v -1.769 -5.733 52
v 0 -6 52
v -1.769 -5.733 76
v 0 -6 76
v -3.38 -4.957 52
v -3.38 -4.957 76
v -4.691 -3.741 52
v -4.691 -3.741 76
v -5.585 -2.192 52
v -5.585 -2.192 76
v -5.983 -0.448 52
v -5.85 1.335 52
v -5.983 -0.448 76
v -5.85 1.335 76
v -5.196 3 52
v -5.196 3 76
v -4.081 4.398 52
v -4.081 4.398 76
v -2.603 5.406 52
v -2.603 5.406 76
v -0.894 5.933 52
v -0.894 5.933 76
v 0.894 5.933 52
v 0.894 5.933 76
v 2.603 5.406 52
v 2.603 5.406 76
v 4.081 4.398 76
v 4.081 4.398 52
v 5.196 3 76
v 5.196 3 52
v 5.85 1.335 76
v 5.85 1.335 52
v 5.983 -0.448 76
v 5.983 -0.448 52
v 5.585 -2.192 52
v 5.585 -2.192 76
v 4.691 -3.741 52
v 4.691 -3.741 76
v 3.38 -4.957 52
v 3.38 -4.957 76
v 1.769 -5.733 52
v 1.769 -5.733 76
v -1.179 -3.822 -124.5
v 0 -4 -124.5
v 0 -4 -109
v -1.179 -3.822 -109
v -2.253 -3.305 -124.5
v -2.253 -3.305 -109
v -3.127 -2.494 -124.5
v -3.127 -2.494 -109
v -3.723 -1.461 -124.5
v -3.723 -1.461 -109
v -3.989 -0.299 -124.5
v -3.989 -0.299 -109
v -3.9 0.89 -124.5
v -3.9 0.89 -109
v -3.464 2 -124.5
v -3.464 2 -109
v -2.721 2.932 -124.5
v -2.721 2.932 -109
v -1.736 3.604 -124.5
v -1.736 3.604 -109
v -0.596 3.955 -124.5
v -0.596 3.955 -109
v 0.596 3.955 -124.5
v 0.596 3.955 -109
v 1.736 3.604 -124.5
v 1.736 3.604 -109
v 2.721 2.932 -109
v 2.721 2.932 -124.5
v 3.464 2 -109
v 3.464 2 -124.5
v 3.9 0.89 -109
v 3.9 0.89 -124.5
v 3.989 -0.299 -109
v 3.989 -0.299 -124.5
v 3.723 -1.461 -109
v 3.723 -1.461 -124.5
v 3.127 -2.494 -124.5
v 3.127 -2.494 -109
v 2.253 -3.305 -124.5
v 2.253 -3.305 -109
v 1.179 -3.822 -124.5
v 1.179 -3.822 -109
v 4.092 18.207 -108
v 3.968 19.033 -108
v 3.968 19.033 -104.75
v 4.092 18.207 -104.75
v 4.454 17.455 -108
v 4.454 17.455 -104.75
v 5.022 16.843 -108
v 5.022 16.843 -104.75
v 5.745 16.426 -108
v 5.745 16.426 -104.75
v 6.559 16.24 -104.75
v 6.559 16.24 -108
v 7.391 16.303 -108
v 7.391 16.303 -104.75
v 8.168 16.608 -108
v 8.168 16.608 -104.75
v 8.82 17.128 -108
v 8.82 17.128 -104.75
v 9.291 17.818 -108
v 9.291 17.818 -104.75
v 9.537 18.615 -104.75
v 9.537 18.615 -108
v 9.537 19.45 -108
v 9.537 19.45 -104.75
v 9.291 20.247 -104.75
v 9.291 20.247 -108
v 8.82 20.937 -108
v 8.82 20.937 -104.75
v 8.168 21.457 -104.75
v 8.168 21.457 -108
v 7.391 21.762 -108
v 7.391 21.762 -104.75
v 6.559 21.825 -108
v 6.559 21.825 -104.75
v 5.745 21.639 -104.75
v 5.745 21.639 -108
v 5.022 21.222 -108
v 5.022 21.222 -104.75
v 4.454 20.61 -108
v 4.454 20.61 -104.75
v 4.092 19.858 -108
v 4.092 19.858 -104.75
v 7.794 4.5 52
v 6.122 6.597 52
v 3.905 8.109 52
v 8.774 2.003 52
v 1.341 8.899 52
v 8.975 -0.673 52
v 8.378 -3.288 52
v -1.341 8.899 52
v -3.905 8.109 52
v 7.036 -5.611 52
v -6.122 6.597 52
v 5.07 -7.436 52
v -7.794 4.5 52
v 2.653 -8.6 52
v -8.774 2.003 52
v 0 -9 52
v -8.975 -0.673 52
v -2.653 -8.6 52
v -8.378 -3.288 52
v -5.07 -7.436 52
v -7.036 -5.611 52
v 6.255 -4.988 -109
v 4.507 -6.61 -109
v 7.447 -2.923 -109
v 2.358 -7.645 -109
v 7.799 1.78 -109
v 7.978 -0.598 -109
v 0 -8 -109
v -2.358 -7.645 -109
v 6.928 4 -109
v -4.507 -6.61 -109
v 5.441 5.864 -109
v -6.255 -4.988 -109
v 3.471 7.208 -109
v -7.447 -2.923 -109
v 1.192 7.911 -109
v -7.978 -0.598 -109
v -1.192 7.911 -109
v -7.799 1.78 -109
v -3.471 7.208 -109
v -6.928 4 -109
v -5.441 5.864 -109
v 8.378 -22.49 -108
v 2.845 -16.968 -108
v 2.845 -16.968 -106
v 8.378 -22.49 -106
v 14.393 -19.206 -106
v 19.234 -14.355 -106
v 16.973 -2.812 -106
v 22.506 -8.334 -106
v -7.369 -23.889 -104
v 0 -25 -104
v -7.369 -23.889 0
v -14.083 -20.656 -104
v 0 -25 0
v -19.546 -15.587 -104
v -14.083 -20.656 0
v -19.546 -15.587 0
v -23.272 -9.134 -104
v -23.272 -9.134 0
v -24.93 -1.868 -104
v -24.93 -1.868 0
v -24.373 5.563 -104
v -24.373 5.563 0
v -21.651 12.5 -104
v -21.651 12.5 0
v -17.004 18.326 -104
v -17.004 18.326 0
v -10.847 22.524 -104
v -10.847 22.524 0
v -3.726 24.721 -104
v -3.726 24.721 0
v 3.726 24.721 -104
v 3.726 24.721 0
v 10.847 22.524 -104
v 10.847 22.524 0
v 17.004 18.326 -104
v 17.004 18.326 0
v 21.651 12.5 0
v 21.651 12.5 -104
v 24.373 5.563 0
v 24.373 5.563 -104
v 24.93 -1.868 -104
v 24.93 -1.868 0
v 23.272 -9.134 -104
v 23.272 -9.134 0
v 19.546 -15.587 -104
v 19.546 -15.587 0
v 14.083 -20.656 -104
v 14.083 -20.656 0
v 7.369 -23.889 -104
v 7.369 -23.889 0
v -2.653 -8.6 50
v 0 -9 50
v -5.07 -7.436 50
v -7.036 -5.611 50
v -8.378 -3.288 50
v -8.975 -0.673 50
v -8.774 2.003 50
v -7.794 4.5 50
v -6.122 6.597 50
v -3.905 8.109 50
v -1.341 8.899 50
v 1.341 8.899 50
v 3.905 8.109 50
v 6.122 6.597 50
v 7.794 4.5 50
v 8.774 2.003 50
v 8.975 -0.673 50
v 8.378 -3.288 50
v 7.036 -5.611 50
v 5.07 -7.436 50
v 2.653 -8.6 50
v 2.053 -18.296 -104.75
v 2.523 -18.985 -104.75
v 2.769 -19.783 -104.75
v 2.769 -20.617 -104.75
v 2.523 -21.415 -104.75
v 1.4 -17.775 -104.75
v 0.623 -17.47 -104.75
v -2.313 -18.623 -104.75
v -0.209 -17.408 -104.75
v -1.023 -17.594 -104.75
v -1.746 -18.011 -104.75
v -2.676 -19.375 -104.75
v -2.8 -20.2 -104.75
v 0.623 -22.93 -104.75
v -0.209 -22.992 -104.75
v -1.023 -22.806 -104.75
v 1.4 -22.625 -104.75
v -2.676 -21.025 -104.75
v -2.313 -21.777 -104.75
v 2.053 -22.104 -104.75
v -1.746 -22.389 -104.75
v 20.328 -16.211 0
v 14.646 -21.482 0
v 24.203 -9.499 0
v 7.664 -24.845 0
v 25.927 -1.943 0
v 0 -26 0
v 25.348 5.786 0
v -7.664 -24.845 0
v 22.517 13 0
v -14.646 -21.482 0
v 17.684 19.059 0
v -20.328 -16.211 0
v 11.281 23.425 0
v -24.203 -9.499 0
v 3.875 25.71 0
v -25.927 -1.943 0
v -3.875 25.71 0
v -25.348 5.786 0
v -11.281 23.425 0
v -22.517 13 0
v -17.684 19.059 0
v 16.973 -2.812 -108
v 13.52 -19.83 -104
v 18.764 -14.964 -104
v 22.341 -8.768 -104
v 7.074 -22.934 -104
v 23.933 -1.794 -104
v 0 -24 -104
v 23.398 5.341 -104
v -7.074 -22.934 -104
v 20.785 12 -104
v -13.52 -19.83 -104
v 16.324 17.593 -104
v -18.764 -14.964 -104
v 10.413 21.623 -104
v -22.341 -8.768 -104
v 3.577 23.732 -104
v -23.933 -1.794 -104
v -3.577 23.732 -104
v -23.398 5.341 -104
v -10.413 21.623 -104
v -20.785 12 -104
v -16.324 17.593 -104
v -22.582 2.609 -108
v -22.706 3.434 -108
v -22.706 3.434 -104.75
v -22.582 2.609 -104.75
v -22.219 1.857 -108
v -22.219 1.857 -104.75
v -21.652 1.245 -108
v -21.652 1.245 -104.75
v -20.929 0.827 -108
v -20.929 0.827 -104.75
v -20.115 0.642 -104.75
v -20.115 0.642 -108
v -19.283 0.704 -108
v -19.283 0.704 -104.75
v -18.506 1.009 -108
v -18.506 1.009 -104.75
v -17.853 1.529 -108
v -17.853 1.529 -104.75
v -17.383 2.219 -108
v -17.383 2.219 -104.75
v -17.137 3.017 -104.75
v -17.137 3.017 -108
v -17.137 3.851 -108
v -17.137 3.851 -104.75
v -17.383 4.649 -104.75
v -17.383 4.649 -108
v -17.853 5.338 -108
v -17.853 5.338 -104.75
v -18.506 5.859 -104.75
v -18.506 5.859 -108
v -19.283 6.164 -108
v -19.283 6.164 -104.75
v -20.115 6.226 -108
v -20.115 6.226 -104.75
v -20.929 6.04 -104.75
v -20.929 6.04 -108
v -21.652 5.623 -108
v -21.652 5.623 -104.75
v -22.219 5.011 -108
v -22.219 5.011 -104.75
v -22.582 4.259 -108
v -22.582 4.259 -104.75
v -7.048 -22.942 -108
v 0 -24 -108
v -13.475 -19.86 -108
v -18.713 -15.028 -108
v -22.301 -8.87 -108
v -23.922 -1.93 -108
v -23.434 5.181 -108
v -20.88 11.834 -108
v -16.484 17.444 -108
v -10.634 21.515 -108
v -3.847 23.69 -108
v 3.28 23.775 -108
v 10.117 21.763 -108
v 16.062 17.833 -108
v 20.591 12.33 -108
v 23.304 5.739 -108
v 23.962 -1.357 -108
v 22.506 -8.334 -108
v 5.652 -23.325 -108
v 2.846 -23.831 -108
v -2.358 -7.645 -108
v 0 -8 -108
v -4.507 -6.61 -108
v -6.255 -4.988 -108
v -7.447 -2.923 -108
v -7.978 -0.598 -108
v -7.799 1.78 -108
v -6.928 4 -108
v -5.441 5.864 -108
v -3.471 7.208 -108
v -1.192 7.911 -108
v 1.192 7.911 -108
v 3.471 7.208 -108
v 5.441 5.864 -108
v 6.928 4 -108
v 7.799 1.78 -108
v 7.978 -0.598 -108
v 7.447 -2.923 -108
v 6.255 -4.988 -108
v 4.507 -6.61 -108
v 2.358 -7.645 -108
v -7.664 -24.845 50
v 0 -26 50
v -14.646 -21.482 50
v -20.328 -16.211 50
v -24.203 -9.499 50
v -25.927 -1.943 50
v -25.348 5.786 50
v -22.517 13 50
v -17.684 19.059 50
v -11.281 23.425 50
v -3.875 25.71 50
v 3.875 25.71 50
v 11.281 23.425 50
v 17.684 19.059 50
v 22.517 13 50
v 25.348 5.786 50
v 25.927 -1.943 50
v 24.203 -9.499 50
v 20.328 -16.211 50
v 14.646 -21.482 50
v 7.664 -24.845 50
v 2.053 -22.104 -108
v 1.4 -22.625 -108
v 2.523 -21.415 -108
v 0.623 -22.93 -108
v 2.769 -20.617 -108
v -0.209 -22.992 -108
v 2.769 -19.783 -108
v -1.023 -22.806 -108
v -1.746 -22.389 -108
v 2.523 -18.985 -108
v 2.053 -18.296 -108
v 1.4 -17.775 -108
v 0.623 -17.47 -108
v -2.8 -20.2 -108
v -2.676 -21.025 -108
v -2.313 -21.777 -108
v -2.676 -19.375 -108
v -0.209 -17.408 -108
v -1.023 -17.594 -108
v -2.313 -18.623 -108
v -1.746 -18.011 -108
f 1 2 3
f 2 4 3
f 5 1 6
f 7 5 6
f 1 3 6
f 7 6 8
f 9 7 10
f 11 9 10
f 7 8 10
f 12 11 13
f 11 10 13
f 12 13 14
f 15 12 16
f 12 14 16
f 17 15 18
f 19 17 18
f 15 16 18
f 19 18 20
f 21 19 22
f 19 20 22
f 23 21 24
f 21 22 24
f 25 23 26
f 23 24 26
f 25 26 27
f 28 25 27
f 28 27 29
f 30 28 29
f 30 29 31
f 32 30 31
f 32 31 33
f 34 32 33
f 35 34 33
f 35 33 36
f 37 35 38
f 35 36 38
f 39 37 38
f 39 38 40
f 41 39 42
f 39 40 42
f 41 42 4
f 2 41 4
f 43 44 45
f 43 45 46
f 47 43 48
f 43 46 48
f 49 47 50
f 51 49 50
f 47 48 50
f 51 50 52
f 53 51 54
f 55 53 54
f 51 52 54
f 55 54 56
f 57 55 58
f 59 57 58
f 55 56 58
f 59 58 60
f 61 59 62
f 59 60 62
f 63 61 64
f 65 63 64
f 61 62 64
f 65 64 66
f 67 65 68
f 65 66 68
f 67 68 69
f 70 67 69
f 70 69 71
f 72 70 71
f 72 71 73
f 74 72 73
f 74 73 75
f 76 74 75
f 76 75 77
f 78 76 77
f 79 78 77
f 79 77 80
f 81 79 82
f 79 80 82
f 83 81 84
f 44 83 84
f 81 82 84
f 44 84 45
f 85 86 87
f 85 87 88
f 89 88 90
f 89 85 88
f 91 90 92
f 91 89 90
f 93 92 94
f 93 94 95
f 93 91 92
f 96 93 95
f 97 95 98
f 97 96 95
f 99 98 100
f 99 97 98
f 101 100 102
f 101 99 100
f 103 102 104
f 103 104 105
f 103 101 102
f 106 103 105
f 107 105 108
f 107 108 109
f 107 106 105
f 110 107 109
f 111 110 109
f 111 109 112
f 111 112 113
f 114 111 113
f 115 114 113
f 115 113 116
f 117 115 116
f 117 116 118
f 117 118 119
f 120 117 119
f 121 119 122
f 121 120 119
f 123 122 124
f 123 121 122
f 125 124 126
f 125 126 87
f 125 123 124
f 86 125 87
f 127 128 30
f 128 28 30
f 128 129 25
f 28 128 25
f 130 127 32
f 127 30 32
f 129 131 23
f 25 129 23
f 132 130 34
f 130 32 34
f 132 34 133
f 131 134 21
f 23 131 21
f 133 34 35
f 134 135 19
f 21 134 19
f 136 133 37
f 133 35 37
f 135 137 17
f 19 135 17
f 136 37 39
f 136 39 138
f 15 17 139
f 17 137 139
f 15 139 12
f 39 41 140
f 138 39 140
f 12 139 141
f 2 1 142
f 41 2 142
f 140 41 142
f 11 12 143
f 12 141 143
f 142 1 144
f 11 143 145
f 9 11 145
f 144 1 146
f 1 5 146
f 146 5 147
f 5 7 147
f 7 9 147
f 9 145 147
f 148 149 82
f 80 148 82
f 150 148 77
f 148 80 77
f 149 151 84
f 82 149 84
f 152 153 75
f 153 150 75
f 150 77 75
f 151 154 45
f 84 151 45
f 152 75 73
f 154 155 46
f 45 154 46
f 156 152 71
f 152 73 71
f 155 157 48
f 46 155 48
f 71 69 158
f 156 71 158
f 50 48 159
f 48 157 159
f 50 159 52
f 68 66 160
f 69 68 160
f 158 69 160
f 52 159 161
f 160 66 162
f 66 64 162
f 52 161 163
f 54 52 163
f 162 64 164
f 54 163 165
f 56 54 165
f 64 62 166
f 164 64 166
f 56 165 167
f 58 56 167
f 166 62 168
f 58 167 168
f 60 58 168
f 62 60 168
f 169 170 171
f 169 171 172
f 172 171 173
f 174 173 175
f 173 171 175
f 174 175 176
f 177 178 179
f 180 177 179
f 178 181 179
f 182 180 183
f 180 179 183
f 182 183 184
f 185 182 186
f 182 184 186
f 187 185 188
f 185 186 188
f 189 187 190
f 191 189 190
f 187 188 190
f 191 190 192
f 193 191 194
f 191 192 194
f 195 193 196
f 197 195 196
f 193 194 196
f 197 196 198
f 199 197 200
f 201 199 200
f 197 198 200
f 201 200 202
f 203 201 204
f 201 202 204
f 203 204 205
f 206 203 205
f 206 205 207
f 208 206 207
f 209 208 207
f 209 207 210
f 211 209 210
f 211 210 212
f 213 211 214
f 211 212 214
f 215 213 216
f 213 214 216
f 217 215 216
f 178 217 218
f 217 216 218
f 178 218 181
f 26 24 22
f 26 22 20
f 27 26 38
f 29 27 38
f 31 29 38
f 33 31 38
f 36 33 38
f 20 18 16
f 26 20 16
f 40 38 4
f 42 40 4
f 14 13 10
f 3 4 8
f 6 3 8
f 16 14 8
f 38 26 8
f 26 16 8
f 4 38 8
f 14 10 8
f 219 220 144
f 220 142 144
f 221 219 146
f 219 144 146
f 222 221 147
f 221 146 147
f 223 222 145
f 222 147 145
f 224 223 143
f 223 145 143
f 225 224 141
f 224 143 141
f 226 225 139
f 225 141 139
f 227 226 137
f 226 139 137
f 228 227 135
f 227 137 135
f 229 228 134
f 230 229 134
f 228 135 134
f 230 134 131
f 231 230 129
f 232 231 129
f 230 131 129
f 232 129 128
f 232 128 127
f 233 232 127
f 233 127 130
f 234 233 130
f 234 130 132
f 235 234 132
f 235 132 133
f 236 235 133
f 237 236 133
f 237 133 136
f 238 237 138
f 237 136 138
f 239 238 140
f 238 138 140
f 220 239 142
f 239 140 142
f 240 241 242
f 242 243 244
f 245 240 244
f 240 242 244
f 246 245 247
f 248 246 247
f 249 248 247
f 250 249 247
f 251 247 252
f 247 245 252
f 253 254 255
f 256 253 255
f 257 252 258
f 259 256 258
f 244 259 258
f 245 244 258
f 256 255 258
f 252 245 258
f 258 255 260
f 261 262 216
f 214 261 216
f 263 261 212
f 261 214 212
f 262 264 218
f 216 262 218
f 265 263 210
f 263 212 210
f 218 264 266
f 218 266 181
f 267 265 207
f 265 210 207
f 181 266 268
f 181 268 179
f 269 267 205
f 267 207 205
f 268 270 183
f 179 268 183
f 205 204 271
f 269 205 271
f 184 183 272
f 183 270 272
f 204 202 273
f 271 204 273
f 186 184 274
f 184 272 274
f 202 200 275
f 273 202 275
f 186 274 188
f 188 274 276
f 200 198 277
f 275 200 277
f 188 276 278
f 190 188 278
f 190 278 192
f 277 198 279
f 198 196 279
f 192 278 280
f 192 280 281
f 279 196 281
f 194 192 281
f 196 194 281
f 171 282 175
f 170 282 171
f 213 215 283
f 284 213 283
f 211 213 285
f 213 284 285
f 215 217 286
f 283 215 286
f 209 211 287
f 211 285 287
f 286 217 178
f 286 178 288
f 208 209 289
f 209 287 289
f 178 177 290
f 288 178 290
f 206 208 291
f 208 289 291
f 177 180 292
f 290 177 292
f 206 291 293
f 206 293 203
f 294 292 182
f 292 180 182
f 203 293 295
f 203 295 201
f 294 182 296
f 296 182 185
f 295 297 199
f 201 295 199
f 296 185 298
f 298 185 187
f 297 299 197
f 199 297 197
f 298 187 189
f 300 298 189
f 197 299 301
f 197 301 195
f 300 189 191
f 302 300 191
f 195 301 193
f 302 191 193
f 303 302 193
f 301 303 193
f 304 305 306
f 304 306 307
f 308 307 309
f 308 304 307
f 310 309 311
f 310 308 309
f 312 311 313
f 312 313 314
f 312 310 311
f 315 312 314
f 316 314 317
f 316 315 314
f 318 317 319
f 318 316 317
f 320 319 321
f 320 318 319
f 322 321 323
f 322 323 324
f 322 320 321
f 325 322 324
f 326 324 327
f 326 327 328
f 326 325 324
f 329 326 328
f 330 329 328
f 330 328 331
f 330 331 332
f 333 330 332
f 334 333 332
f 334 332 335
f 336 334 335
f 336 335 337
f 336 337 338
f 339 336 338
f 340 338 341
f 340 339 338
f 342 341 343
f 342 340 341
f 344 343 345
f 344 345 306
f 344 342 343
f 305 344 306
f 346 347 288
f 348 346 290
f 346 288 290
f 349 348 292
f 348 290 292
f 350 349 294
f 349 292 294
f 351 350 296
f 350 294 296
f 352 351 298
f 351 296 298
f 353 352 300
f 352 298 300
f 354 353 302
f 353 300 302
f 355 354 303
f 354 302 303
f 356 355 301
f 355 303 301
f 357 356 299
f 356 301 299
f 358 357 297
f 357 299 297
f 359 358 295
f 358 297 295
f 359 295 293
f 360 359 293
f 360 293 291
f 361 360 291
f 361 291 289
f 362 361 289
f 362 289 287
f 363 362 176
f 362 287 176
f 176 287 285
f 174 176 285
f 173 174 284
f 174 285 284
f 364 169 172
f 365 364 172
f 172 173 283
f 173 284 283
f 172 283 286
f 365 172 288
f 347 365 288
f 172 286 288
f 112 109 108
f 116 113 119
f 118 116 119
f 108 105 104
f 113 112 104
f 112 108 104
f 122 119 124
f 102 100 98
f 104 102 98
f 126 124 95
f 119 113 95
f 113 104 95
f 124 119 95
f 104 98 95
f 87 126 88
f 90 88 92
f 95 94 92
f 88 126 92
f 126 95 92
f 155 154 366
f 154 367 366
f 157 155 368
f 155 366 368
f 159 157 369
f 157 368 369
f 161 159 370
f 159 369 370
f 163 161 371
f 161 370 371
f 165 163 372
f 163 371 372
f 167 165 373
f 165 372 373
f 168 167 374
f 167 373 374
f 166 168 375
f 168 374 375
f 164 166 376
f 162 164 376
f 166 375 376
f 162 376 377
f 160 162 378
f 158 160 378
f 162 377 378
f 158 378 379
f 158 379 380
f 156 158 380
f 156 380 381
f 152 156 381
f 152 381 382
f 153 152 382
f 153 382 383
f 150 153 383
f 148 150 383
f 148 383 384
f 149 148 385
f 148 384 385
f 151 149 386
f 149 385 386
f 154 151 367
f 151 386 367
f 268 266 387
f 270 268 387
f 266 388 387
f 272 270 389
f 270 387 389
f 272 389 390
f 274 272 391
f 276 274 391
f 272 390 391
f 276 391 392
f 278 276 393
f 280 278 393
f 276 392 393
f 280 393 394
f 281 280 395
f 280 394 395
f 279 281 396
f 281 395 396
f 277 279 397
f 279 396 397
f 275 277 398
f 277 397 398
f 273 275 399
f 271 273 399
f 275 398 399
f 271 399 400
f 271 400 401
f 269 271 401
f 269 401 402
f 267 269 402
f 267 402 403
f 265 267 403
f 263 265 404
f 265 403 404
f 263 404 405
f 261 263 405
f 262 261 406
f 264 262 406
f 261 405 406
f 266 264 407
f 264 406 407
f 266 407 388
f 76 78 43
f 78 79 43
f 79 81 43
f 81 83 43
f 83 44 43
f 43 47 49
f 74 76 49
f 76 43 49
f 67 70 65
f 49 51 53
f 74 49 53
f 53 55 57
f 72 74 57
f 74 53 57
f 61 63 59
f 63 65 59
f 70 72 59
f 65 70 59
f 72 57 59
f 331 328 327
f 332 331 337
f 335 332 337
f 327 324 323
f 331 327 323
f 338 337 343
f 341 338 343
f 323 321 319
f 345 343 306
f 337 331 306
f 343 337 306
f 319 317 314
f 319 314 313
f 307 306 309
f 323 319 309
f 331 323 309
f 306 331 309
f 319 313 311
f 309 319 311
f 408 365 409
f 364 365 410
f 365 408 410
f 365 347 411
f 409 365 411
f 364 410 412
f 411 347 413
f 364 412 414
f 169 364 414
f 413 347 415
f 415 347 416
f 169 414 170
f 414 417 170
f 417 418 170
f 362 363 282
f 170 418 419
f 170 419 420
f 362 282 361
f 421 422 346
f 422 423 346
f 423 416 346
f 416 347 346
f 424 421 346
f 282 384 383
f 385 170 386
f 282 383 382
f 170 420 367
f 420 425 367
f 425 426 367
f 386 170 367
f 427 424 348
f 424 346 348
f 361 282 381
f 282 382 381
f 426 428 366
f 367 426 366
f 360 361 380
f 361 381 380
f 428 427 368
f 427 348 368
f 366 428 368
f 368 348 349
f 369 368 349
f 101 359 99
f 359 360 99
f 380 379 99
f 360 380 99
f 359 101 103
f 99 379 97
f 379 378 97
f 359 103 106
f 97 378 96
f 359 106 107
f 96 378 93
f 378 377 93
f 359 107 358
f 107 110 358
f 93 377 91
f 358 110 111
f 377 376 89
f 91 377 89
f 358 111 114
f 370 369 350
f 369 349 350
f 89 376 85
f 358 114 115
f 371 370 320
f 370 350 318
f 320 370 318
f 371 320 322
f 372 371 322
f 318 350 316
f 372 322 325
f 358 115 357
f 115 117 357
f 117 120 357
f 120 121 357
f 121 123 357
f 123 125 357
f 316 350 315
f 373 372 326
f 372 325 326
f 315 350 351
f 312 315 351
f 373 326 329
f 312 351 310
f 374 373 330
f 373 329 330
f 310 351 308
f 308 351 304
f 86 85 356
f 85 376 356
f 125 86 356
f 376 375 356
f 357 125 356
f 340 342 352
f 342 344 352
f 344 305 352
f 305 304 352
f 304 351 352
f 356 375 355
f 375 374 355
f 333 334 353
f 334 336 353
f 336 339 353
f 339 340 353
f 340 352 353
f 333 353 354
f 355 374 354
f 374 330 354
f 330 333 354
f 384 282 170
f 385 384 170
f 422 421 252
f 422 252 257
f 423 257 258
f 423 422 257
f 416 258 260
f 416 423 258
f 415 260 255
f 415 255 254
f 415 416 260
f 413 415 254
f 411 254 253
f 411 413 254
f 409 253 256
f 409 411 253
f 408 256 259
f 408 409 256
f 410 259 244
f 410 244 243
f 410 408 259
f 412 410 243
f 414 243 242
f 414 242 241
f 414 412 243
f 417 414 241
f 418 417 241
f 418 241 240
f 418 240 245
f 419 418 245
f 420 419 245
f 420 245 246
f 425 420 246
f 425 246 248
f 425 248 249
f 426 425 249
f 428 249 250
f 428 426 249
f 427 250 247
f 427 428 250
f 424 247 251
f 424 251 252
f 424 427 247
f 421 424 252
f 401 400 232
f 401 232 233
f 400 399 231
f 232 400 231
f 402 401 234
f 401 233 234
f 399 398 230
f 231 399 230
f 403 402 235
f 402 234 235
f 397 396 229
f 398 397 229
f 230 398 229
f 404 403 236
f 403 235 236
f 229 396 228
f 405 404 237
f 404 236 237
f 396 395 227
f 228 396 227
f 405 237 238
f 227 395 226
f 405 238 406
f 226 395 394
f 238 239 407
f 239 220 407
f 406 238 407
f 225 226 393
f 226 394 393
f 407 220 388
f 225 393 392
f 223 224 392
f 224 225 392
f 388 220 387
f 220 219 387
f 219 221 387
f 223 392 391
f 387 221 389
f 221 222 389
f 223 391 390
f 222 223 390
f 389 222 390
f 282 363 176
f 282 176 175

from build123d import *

# Parameters (mm, degrees)
SKETCH3_R          = 2.8
CUT_EXTRUDE2_DEPTH = 3.25
CUT_EXTRUDE3_DEPTH = 2


with BuildPart() as part:
    # Sketch1 → Revolve1 (revolve)
    with BuildSketch(Plane(origin=(0, 0, 0), x_dir=(0, 0, -1), z_dir=(1, 0, 0)), mode=Mode.PRIVATE) as revolve1_sk:
        Polygon((-76, 0), (124.5, 0), (124.5, 4), (109, 4), (109, 8), (108, 8), (108, 24), (104, 24), (104, 25), (0, 25), (0, 26), (-50, 26), (-50, 9), (-52, 9), (-52, 6), (-76, 6), align=None)
    revolve(revolve1_sk.sketch.rotate(Axis((0, 0, 76), (0, 0, -1)), 180), axis=Axis((0, 0, 76), (0, 0, -1)))

    # Sketch3 → Cut-Extrude2 (cut)
    with BuildSketch(Plane.XY.offset(-108)):
        with Locations(Location((6.767859423, 19.032500593, 0), (0, 0, 180))):
            Circle(SKETCH3_R)
        with Locations(Location((-19.905985431, 3.433910891, 0), (0, 0, 180))):
            Circle(SKETCH3_R)
        with Locations(Location((0, -20.2, 0), (0, 0, 180))):
            Circle(SKETCH3_R)
    extrude(amount=CUT_EXTRUDE2_DEPTH, mode=Mode.SUBTRACT)

    # Sketch4 → Cut-Extrude3 (cut)
    with BuildSketch(Plane(origin=(0, 0, -108), x_dir=(-1, 0, 0), z_dir=(0, 0, -1))):
        Polygon((-22.506441861, -8.334271099), (-16.973308635, -2.811902197), (-2.844949371, -16.967800773), (-8.378082597, -22.490169675), (-11.338488517, -25.444816332), (-25.466847781, -11.288917756), align=None)
    extrude(amount=-CUT_EXTRUDE3_DEPTH, mode=Mode.SUBTRACT)


solid = part.part
